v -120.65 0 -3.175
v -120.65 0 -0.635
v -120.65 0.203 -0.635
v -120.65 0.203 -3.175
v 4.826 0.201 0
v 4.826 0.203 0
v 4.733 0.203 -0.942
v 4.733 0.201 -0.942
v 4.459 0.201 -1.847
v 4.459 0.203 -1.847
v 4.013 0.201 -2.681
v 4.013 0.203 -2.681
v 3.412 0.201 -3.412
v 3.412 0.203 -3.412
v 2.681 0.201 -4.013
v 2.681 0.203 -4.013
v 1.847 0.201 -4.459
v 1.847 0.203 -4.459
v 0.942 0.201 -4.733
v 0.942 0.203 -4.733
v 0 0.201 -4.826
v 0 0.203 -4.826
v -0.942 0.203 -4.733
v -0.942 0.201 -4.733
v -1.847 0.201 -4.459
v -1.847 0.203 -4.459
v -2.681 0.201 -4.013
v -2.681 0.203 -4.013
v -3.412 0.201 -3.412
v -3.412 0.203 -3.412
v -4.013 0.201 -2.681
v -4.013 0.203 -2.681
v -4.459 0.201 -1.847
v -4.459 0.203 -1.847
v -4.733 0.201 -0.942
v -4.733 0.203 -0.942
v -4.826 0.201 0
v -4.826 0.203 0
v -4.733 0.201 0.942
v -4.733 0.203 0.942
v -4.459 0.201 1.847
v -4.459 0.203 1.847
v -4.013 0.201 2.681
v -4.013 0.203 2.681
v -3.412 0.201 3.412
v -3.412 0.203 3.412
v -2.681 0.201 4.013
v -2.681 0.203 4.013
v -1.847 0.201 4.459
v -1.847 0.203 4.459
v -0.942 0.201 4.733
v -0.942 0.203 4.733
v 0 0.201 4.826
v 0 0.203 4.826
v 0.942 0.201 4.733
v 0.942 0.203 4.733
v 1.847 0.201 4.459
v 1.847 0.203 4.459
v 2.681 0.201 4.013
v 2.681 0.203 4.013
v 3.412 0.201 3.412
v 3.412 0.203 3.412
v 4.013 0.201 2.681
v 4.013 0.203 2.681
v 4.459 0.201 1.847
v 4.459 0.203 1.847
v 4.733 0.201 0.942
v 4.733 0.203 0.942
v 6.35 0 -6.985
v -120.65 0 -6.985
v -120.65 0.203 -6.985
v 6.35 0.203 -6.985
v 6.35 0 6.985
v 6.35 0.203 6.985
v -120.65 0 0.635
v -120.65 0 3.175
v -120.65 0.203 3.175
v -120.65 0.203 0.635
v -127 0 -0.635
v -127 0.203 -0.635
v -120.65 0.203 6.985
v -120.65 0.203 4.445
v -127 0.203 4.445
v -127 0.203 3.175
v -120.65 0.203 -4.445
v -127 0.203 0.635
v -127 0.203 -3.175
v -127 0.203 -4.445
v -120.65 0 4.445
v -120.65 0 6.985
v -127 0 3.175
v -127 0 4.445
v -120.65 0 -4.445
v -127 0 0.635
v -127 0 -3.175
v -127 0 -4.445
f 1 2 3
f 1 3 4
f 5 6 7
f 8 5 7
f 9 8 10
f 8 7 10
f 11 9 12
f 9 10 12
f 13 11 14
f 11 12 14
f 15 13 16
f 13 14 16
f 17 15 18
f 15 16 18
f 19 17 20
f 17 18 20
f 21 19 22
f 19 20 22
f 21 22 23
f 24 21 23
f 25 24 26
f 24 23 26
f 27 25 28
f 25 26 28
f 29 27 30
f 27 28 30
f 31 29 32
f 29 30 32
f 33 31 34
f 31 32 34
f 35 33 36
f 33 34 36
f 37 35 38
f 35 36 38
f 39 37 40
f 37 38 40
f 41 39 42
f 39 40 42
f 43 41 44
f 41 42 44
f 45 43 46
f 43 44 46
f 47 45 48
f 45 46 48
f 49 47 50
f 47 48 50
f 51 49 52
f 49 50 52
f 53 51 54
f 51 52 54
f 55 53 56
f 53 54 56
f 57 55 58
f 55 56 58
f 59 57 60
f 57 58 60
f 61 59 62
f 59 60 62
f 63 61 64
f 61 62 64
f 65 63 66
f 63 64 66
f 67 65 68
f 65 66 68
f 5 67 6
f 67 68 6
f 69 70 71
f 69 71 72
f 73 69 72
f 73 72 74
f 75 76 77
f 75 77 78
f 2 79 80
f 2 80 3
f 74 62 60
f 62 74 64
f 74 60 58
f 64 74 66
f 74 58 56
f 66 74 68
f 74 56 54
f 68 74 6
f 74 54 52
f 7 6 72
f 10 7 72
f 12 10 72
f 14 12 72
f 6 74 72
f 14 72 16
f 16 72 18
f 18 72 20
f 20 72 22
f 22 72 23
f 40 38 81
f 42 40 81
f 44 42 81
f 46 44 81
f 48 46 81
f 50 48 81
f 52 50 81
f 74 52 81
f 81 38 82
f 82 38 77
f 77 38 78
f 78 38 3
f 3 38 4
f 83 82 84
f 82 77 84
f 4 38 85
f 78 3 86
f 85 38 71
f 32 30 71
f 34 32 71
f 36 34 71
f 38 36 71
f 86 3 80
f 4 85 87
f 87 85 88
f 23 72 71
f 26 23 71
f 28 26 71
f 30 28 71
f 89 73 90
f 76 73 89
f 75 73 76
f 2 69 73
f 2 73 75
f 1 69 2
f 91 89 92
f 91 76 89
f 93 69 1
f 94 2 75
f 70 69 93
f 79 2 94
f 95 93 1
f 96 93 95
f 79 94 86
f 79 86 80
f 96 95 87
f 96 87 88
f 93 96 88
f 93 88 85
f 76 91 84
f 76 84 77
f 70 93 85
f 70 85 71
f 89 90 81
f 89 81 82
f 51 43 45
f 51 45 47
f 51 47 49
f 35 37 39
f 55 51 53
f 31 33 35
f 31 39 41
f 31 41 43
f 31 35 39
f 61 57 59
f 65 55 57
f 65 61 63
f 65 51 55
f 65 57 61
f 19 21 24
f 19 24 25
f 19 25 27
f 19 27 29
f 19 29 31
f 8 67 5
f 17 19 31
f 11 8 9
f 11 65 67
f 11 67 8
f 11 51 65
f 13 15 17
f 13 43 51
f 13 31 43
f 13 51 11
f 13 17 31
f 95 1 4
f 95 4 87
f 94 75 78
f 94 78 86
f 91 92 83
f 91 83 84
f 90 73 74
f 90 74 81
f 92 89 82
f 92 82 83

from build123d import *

# Parameters (mm, degrees)
BOSS_EXTRUDE1_DEPTH = 0.2032
SKETCH2_R           = 4.826
CUT_EXTRUDE1_DEPTH  = 0.00254


with BuildPart() as part:
    # Sketch1 → Boss-Extrude1 (new body)
    with BuildSketch(Plane(origin=(0, 0, 0), x_dir=(1, 0, 0), z_dir=(0, 1, 0))):
        Polygon((-120.65, -0.635), (-127, -0.635), (-127, 0.635), (-120.65, 0.635), (-120.65, 3.175), (-127, 3.175), (-127, 4.445), (-120.65, 4.445), (-120.65, 6.985), (6.35, 6.985), (6.35, -6.985), (-120.65, -6.985), (-120.65, -4.445), (-127, -4.445), (-127, -3.175), (-120.65, -3.175), align=None)
    extrude(amount=BOSS_EXTRUDE1_DEPTH)

    # Sketch2 → Cut-Extrude1 (cut)
    with BuildSketch(Plane(origin=(0, 0.2032, 0), x_dir=(1, 0, 0), z_dir=(0, 1, 0))):
        Circle(SKETCH2_R)
    extrude(amount=-CUT_EXTRUDE1_DEPTH, mode=Mode.SUBTRACT)


solid = part.part
